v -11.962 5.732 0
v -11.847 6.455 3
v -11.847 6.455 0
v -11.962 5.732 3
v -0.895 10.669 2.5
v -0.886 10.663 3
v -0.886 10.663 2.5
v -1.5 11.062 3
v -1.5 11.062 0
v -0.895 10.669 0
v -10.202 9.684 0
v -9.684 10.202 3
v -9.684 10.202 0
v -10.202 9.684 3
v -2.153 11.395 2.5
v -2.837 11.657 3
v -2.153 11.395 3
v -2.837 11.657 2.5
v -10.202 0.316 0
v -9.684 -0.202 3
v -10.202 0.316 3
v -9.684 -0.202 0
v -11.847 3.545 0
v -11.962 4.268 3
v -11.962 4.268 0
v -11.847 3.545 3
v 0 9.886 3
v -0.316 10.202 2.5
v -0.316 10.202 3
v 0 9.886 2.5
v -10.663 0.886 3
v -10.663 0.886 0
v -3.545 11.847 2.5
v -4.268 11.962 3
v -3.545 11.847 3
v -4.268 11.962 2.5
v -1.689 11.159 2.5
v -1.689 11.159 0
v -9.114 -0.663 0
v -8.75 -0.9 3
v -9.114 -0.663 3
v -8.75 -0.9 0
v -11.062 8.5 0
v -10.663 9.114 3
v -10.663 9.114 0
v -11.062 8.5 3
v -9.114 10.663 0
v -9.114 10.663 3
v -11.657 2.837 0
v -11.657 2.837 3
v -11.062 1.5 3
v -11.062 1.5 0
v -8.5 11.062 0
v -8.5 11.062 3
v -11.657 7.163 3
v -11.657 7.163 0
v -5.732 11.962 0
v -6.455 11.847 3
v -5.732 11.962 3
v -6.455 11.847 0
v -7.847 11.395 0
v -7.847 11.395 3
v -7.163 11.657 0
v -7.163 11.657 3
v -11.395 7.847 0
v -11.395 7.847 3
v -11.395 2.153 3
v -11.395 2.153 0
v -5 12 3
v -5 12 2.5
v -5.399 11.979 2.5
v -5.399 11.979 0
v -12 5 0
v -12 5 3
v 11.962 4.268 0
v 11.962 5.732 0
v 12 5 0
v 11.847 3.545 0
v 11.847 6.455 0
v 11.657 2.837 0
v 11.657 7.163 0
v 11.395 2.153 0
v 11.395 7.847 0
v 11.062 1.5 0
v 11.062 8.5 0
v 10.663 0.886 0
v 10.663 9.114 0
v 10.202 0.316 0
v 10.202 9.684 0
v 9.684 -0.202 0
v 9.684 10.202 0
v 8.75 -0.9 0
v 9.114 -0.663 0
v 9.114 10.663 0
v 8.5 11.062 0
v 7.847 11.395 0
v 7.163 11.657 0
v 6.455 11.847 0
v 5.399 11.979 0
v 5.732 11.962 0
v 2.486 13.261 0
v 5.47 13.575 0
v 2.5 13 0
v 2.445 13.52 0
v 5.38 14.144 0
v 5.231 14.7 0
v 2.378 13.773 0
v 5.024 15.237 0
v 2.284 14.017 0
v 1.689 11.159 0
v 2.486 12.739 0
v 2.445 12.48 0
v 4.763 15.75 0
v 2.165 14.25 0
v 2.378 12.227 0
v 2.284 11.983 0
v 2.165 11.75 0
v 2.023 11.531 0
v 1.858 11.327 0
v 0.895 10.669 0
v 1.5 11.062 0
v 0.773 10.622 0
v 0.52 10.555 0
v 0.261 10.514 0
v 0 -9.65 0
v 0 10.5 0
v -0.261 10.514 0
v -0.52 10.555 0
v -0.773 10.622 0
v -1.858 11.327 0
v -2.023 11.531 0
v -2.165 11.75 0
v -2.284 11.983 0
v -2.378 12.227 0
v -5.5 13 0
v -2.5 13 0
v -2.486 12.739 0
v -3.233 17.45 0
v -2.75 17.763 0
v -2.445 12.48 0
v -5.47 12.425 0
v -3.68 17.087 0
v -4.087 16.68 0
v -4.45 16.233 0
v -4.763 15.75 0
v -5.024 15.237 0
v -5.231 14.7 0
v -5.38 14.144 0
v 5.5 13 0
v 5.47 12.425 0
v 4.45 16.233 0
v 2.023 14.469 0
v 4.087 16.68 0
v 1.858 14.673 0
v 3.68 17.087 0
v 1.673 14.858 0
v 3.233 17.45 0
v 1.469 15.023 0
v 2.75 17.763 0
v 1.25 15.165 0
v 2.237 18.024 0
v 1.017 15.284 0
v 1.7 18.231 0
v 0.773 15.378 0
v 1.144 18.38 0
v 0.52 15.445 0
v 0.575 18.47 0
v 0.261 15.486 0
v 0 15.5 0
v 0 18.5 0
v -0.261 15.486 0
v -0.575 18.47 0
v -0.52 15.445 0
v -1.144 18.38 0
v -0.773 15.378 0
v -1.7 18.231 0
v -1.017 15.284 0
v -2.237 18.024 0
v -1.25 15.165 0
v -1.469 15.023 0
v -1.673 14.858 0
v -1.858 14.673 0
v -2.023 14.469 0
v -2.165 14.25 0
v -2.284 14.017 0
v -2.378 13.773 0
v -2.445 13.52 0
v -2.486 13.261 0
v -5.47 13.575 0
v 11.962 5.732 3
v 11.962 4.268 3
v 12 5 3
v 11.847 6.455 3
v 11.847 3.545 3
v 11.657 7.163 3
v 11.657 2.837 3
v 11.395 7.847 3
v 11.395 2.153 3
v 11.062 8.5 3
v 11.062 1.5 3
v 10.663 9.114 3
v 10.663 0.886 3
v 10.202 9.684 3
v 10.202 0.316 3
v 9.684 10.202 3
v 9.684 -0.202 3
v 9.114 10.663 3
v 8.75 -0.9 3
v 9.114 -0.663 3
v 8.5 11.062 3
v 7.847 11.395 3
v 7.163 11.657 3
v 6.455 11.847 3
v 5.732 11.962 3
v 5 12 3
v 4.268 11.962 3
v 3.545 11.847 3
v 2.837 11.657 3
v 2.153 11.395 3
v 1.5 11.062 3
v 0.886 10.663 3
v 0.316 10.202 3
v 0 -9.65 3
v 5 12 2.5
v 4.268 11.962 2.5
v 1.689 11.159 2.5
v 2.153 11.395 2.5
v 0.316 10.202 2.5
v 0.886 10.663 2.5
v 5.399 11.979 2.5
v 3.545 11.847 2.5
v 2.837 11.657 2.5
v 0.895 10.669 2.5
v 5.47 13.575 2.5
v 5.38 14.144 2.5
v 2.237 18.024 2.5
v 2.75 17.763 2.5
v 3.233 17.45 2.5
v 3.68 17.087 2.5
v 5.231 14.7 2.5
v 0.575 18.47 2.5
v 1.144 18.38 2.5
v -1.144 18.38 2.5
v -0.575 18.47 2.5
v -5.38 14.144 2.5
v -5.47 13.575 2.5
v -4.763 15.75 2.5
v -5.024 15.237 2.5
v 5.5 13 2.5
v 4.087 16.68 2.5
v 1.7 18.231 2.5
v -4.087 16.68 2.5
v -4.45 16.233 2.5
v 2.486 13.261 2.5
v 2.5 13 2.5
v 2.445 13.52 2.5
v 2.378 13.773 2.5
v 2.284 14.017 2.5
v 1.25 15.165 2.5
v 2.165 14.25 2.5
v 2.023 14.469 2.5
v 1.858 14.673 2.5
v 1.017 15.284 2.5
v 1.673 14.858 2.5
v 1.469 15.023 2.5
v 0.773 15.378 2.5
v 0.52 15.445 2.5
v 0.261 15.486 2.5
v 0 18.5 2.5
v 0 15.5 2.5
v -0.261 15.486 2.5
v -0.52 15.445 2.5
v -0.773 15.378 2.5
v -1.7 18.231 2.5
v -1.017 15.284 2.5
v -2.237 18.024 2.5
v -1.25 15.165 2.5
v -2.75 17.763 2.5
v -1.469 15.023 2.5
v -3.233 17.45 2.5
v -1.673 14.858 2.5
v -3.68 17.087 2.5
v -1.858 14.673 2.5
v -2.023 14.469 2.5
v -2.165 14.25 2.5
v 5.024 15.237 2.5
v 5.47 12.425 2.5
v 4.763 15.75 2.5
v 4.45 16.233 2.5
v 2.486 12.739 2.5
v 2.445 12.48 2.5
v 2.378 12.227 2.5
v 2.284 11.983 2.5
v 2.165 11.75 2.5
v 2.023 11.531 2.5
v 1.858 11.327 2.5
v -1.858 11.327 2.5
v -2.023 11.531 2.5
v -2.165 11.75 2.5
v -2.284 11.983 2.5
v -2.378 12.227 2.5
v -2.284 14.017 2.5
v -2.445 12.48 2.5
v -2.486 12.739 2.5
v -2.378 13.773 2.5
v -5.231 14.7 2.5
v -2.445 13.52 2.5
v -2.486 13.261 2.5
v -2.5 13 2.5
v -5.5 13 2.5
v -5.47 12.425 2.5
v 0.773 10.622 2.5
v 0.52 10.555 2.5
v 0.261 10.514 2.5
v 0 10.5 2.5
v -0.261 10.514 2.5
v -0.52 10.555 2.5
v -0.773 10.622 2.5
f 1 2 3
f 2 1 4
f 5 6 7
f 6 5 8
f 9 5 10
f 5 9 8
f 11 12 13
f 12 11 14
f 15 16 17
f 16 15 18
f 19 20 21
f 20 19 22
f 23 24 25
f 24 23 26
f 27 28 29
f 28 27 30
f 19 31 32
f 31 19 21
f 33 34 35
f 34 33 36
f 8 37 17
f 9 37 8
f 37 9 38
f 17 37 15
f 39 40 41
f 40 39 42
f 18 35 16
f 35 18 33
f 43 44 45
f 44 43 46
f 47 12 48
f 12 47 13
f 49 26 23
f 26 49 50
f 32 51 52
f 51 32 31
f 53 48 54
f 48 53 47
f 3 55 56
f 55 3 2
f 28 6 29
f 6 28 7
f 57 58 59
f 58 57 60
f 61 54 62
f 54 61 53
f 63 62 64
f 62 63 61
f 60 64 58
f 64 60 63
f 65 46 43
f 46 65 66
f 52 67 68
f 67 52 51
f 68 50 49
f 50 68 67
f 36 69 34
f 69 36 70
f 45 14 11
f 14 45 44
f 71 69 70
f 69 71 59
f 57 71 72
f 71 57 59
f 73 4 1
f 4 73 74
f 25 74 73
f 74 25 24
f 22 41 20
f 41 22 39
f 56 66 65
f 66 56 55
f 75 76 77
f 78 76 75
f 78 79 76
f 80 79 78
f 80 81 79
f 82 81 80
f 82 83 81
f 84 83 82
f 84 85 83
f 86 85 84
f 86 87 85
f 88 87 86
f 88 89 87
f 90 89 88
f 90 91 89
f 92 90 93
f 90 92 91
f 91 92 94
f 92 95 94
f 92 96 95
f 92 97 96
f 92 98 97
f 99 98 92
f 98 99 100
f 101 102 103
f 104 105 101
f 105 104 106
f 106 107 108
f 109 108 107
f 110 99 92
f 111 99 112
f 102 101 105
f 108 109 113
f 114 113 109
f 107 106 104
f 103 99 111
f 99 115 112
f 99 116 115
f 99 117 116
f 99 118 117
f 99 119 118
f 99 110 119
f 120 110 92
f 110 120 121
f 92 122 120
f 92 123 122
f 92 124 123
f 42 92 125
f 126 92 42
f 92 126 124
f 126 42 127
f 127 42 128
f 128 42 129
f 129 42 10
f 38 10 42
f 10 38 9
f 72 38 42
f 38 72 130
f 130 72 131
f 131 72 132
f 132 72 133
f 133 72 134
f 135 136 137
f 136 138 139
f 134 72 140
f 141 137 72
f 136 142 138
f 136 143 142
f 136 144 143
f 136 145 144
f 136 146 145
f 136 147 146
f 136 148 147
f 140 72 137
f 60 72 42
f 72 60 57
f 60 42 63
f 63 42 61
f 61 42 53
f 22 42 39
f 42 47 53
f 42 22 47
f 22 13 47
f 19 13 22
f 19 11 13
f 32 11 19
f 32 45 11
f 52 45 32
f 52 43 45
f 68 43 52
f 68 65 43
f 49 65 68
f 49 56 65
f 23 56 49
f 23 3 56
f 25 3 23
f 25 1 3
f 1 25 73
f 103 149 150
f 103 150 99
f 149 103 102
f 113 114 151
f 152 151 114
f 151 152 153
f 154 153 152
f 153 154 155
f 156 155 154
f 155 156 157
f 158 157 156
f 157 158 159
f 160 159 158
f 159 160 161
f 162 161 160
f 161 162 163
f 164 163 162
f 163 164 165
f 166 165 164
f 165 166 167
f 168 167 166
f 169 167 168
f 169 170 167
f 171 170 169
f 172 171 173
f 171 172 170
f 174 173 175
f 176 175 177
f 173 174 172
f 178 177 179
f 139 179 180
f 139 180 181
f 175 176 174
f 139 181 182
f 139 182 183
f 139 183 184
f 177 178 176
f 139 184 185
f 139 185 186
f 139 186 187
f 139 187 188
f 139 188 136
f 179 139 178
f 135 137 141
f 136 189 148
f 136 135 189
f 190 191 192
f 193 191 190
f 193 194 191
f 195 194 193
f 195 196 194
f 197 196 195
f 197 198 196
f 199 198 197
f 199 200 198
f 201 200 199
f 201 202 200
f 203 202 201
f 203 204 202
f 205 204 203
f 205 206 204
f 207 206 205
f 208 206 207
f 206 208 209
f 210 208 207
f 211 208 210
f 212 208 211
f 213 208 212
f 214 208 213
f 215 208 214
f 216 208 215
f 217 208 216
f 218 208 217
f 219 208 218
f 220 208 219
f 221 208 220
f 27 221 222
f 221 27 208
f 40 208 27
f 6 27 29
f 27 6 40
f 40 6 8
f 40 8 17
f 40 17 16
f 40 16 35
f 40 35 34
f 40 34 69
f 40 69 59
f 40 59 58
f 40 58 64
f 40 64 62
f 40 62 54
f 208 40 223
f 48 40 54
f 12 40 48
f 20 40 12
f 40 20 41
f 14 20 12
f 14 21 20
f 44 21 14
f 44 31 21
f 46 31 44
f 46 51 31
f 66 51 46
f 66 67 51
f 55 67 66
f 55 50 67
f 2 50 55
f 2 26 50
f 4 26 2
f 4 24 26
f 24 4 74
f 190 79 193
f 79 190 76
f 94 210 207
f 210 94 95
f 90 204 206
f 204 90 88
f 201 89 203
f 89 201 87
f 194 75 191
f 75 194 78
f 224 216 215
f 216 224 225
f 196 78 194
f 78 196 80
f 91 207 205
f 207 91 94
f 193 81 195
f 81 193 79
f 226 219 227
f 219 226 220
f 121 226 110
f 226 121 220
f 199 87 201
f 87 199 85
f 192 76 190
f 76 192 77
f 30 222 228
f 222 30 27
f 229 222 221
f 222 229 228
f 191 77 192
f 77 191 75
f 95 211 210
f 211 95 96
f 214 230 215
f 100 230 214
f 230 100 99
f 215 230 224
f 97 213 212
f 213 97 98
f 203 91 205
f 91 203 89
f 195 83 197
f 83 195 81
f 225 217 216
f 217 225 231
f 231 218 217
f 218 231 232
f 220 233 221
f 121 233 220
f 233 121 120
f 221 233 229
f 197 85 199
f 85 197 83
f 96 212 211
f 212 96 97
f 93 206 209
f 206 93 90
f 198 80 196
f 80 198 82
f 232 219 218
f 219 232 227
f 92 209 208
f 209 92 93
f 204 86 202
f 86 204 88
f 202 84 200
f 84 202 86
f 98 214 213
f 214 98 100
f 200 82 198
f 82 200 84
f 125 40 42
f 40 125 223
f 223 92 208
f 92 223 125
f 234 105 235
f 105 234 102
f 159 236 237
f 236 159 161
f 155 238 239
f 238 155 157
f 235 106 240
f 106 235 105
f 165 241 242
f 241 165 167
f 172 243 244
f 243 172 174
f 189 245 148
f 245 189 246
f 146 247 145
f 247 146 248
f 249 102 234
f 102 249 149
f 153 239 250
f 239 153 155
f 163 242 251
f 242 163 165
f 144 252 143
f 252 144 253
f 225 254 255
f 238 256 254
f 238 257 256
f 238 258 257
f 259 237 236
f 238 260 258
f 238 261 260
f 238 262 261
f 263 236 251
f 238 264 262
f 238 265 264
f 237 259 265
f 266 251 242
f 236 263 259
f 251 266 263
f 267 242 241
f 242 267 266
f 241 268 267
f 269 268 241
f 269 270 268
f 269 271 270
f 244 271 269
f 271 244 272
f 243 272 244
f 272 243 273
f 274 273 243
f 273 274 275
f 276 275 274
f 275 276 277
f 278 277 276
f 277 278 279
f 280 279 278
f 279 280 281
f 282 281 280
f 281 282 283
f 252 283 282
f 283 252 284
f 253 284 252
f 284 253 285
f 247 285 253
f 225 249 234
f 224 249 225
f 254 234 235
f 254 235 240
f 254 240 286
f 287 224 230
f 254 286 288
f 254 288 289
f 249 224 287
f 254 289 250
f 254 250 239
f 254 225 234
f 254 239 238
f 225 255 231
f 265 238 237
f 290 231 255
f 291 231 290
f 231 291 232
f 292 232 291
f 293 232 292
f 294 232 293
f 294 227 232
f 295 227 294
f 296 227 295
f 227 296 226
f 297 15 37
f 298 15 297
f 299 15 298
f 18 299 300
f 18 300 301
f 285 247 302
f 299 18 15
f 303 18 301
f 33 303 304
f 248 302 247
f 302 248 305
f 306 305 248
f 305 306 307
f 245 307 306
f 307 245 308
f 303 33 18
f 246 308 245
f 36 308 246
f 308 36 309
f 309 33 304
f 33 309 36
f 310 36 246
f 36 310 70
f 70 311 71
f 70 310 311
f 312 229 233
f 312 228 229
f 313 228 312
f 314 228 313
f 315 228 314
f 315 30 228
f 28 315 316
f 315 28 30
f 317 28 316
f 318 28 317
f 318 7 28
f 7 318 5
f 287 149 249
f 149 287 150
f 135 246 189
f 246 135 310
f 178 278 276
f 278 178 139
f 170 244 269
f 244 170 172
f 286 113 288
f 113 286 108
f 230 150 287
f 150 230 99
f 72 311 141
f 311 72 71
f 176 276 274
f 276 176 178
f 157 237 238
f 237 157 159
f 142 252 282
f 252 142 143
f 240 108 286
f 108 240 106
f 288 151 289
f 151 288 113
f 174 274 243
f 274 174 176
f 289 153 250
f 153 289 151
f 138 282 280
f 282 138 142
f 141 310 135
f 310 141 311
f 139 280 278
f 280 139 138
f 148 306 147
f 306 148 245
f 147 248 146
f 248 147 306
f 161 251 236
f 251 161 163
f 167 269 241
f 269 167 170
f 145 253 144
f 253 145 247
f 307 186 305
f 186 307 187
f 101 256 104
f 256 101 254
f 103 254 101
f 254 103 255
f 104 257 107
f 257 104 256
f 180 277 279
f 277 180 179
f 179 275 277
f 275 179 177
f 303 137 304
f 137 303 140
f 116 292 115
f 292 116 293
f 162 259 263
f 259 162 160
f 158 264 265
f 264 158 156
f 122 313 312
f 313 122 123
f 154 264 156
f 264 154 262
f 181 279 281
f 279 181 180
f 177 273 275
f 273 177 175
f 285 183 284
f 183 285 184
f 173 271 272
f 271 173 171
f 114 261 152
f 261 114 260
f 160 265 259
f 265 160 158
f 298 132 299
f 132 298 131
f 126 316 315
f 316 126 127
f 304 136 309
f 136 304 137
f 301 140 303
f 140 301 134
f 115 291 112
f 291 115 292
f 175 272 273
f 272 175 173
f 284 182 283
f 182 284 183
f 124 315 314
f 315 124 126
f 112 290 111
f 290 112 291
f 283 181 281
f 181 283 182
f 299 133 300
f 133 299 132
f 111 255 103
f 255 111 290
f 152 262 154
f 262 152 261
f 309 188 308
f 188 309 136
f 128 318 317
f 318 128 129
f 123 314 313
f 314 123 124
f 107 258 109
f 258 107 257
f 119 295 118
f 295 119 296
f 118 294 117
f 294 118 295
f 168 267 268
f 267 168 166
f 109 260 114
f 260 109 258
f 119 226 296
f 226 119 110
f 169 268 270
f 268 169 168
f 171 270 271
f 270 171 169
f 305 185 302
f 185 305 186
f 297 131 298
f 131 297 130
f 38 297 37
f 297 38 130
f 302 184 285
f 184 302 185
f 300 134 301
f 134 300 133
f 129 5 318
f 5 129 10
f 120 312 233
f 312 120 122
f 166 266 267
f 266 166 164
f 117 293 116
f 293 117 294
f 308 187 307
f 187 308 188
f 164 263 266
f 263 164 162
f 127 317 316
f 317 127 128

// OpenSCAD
$fn = 60;
altura = 3;

module coracao_base_cubo() {
    union() {
        // As duas metades superiores (arredondadas para formar o topo do coração)
        translate([-5, 5, 0]) cylinder(h = altura, r = 7);
        translate([5, 5, 0]) cylinder(h = altura, r = 7);
        
        // O Bico: um cubo rodado a 45 graus para criar uma ponta geométrica
        translate([0, -9.65, 0]) 
        rotate([0, 0, 45]) 
        cube([13.5, 13, altura], center = false);
    }
}

// Junta a forma com a argola física
union() {
    coracao_base_cubo();
    
    // Argola integrada no topo (também com aspeto robusto)
    translate([0, 13, 0]) 
    difference() {
        cylinder(h = 2.5, r = 5.5, center = false);
        translate([0, 0, -1]) cylinder(h = altura + 2, r = 2.5);
    }
}
